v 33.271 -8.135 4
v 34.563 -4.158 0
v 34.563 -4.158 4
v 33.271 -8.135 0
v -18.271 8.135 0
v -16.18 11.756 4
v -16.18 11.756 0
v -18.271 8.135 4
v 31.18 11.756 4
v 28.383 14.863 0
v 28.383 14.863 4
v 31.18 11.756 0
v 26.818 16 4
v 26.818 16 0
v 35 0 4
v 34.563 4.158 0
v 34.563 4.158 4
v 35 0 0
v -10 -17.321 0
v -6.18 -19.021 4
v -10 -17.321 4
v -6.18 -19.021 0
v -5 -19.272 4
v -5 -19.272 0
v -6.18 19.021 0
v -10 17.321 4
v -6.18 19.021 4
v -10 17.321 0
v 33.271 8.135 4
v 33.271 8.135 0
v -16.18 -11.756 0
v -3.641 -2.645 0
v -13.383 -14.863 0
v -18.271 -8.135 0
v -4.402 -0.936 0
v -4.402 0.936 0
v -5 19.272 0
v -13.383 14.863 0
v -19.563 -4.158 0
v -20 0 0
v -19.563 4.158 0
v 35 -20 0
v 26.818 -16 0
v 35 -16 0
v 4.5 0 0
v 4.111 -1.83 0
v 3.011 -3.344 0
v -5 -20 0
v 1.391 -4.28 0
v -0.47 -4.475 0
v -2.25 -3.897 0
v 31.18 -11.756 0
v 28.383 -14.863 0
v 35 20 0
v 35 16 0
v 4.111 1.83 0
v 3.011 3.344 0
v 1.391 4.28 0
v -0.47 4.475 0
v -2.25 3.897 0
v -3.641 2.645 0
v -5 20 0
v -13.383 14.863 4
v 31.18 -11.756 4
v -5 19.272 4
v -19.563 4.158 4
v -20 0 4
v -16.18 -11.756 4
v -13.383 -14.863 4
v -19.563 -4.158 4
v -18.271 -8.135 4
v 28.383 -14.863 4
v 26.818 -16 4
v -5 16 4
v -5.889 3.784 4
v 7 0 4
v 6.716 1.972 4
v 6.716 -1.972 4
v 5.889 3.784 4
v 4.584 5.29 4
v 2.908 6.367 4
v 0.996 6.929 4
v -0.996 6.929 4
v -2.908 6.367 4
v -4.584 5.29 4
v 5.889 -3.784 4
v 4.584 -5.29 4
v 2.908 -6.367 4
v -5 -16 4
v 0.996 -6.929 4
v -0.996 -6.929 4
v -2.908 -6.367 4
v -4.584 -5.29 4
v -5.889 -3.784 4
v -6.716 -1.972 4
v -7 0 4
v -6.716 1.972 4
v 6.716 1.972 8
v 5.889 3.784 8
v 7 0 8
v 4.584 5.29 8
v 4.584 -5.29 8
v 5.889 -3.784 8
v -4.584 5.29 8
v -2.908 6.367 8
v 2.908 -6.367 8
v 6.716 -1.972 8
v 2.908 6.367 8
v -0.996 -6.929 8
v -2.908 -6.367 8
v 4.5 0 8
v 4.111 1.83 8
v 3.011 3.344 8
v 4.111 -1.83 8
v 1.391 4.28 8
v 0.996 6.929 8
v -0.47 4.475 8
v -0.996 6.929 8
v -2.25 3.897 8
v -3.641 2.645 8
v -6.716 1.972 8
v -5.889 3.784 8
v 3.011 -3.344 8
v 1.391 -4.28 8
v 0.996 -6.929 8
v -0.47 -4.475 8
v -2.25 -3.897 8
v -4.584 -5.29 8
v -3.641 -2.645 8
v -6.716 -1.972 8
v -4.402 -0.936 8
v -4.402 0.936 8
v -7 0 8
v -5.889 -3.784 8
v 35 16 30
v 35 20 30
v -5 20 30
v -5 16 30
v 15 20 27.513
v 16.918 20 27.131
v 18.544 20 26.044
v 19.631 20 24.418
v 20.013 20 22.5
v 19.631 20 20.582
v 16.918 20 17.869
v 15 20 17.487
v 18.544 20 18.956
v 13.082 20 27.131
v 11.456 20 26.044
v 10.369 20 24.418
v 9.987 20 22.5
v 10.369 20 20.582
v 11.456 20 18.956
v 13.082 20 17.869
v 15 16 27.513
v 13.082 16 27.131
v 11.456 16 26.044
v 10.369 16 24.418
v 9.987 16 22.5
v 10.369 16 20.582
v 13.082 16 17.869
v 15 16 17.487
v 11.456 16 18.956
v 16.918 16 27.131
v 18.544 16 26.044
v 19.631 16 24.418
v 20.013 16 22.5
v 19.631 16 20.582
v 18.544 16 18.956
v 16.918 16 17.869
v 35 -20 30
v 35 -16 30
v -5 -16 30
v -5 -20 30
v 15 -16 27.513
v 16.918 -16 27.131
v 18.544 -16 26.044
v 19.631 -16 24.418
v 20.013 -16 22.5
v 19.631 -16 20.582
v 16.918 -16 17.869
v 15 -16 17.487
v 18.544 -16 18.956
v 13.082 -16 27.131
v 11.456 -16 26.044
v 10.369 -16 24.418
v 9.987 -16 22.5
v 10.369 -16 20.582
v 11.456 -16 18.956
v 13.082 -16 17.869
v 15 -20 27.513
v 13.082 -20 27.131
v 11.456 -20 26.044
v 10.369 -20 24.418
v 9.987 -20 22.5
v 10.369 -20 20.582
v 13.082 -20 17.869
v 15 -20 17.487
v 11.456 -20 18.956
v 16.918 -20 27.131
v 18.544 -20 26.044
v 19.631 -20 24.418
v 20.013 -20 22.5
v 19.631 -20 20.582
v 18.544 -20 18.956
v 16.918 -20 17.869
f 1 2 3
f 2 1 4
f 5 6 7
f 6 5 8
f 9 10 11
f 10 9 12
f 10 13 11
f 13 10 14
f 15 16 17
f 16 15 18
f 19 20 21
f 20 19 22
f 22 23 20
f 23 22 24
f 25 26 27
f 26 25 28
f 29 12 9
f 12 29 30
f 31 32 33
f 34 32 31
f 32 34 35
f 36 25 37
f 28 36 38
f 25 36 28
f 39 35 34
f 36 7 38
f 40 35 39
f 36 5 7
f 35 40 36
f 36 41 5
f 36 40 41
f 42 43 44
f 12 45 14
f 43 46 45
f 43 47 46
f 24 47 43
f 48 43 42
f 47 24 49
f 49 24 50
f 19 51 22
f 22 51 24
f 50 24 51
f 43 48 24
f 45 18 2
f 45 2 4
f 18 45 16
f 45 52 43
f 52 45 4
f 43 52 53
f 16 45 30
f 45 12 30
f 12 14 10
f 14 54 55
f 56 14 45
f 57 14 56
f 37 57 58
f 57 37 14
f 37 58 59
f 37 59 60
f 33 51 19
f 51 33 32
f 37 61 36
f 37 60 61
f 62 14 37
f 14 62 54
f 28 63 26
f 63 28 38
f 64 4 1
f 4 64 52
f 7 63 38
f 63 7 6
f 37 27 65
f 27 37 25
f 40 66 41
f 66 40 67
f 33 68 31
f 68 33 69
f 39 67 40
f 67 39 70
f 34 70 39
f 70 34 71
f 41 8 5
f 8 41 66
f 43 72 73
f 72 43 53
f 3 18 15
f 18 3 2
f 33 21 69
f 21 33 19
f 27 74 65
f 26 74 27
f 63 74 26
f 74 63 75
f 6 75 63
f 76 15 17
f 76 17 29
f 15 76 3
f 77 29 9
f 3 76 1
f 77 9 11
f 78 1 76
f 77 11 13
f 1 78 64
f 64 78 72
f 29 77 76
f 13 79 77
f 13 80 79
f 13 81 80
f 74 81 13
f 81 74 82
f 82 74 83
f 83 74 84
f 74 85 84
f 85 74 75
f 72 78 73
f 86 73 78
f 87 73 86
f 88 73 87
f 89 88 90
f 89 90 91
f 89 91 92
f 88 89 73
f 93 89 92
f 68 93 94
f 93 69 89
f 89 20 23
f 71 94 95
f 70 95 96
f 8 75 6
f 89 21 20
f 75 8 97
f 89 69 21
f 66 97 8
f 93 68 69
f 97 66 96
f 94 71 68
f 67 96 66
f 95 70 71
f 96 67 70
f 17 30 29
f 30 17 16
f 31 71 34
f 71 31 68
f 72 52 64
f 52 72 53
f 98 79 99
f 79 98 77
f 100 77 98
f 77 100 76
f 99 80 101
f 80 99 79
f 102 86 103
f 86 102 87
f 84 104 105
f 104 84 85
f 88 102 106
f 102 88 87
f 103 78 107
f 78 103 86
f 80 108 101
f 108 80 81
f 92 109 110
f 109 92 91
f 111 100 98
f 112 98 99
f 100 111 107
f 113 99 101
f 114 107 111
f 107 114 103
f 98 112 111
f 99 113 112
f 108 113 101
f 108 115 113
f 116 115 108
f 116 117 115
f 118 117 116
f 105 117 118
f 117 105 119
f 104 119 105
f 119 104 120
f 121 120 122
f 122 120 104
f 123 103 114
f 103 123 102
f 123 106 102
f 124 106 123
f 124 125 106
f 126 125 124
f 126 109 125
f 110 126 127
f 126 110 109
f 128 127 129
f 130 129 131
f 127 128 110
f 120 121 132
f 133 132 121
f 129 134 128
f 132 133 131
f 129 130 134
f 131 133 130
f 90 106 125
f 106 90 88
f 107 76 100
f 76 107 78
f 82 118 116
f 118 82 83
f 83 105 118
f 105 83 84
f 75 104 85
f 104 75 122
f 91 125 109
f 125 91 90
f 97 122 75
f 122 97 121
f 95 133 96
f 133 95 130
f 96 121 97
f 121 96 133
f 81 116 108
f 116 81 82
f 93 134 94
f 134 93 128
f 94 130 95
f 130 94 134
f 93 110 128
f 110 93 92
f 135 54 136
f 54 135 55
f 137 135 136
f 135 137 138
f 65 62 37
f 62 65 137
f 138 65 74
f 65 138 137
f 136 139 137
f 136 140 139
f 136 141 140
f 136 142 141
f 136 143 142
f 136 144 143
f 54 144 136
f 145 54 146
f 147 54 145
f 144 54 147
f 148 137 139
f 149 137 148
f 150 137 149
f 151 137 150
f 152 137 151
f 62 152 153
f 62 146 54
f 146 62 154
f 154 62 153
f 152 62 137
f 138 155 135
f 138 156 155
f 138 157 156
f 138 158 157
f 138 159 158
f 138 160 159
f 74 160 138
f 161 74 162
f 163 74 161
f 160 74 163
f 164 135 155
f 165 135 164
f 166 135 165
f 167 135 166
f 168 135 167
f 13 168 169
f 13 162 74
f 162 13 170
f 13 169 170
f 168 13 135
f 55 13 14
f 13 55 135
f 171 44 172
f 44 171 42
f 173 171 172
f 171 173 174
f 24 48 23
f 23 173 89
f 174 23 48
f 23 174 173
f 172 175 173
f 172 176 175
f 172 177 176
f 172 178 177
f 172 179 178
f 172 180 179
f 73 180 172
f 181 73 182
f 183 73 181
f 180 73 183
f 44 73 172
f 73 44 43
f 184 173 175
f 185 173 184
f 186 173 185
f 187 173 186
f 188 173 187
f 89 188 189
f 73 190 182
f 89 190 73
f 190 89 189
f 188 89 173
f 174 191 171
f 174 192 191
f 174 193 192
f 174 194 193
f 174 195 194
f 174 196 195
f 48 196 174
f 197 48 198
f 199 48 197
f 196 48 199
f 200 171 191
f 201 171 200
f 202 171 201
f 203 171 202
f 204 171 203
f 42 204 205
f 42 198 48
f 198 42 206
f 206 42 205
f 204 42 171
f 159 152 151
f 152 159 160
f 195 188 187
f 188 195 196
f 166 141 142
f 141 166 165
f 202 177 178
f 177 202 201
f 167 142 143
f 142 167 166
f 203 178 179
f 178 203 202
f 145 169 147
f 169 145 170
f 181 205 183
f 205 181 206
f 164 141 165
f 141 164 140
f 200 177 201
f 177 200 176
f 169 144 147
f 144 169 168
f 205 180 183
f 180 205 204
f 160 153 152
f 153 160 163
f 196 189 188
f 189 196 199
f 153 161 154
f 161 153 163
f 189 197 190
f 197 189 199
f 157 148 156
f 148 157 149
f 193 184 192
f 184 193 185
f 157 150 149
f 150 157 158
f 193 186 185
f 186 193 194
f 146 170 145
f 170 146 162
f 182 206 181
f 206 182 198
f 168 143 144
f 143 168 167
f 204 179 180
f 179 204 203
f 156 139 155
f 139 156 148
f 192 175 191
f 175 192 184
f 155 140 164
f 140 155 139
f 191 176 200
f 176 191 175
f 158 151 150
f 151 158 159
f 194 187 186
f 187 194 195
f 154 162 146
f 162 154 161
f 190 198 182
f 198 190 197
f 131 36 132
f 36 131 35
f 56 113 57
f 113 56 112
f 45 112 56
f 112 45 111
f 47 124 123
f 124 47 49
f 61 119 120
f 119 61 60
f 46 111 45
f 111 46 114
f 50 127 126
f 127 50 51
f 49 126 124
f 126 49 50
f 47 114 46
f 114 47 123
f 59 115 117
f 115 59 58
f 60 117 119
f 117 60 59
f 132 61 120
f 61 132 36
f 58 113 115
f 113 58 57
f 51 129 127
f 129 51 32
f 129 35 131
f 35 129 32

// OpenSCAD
// design a simple spool for winding Archemedes Spiral

pi = 3.1415;
agap=4.25;// distance between arms of the spiral
axel = 3/8*25.4; //diameter of the center dowel
string_dia = 1;

//arch_spool ();
//wire_axel();
pen_top (spool_dia=30,spool_height=30,axel_dia=axel);



module arch_spool (gap=4.25,axel=3/8*25.4,len=30){
	difference (){
		cylinder (r=(gap)/2*pi,h=len);
		cylinder (r=axel/2+0.5,h=len);
	}
	cylinder (r=gap/2*pi+3,h=0.25); //disk to help hold the print down
}


module wire_axel(axeldia=3/8*25.5,spool_dia=30,spool_height=30){
	difference(){
		cylinder (r=spool_dia/2-1,h=spool_height+2,center=true);
		cylinder (r=axeldia/2+1,h=spool_height+10,center=true);
	}
}

module pen_top(spool_dia,spool_height,axel_dia) {
pen_dia=8;
	difference (){
		union() {
			translate ([0,0,2]) hull() {
				cylinder (r=(spool_height+10)/2,h=4,center=true);
				translate ([spool_dia/2,0,0]) cylinder (r=(spool_height+10)/2,h=4,center=true);
			}
			
			cylinder (r=pen_dia/2+3,h=8);
			translate ([spool_dia/2,spool_height/2+4/2+1,spool_dia/2]) cube ([spool_height+10,4,spool_dia],center = true);
			translate ([spool_dia/2,-spool_height/2-4/2-1,spool_dia/2]) cube ([spool_height+10,4,spool_dia],center = true);	
		}
		translate ([spool_dia/2,0,0.75*spool_dia]) rotate ([90,0,0])cylinder (r=axel_dia/2+0.25,h=spool_height+15,center=true);
		cylinder (r=pen_dia/2+0.5,h=20);
	}
}
	
